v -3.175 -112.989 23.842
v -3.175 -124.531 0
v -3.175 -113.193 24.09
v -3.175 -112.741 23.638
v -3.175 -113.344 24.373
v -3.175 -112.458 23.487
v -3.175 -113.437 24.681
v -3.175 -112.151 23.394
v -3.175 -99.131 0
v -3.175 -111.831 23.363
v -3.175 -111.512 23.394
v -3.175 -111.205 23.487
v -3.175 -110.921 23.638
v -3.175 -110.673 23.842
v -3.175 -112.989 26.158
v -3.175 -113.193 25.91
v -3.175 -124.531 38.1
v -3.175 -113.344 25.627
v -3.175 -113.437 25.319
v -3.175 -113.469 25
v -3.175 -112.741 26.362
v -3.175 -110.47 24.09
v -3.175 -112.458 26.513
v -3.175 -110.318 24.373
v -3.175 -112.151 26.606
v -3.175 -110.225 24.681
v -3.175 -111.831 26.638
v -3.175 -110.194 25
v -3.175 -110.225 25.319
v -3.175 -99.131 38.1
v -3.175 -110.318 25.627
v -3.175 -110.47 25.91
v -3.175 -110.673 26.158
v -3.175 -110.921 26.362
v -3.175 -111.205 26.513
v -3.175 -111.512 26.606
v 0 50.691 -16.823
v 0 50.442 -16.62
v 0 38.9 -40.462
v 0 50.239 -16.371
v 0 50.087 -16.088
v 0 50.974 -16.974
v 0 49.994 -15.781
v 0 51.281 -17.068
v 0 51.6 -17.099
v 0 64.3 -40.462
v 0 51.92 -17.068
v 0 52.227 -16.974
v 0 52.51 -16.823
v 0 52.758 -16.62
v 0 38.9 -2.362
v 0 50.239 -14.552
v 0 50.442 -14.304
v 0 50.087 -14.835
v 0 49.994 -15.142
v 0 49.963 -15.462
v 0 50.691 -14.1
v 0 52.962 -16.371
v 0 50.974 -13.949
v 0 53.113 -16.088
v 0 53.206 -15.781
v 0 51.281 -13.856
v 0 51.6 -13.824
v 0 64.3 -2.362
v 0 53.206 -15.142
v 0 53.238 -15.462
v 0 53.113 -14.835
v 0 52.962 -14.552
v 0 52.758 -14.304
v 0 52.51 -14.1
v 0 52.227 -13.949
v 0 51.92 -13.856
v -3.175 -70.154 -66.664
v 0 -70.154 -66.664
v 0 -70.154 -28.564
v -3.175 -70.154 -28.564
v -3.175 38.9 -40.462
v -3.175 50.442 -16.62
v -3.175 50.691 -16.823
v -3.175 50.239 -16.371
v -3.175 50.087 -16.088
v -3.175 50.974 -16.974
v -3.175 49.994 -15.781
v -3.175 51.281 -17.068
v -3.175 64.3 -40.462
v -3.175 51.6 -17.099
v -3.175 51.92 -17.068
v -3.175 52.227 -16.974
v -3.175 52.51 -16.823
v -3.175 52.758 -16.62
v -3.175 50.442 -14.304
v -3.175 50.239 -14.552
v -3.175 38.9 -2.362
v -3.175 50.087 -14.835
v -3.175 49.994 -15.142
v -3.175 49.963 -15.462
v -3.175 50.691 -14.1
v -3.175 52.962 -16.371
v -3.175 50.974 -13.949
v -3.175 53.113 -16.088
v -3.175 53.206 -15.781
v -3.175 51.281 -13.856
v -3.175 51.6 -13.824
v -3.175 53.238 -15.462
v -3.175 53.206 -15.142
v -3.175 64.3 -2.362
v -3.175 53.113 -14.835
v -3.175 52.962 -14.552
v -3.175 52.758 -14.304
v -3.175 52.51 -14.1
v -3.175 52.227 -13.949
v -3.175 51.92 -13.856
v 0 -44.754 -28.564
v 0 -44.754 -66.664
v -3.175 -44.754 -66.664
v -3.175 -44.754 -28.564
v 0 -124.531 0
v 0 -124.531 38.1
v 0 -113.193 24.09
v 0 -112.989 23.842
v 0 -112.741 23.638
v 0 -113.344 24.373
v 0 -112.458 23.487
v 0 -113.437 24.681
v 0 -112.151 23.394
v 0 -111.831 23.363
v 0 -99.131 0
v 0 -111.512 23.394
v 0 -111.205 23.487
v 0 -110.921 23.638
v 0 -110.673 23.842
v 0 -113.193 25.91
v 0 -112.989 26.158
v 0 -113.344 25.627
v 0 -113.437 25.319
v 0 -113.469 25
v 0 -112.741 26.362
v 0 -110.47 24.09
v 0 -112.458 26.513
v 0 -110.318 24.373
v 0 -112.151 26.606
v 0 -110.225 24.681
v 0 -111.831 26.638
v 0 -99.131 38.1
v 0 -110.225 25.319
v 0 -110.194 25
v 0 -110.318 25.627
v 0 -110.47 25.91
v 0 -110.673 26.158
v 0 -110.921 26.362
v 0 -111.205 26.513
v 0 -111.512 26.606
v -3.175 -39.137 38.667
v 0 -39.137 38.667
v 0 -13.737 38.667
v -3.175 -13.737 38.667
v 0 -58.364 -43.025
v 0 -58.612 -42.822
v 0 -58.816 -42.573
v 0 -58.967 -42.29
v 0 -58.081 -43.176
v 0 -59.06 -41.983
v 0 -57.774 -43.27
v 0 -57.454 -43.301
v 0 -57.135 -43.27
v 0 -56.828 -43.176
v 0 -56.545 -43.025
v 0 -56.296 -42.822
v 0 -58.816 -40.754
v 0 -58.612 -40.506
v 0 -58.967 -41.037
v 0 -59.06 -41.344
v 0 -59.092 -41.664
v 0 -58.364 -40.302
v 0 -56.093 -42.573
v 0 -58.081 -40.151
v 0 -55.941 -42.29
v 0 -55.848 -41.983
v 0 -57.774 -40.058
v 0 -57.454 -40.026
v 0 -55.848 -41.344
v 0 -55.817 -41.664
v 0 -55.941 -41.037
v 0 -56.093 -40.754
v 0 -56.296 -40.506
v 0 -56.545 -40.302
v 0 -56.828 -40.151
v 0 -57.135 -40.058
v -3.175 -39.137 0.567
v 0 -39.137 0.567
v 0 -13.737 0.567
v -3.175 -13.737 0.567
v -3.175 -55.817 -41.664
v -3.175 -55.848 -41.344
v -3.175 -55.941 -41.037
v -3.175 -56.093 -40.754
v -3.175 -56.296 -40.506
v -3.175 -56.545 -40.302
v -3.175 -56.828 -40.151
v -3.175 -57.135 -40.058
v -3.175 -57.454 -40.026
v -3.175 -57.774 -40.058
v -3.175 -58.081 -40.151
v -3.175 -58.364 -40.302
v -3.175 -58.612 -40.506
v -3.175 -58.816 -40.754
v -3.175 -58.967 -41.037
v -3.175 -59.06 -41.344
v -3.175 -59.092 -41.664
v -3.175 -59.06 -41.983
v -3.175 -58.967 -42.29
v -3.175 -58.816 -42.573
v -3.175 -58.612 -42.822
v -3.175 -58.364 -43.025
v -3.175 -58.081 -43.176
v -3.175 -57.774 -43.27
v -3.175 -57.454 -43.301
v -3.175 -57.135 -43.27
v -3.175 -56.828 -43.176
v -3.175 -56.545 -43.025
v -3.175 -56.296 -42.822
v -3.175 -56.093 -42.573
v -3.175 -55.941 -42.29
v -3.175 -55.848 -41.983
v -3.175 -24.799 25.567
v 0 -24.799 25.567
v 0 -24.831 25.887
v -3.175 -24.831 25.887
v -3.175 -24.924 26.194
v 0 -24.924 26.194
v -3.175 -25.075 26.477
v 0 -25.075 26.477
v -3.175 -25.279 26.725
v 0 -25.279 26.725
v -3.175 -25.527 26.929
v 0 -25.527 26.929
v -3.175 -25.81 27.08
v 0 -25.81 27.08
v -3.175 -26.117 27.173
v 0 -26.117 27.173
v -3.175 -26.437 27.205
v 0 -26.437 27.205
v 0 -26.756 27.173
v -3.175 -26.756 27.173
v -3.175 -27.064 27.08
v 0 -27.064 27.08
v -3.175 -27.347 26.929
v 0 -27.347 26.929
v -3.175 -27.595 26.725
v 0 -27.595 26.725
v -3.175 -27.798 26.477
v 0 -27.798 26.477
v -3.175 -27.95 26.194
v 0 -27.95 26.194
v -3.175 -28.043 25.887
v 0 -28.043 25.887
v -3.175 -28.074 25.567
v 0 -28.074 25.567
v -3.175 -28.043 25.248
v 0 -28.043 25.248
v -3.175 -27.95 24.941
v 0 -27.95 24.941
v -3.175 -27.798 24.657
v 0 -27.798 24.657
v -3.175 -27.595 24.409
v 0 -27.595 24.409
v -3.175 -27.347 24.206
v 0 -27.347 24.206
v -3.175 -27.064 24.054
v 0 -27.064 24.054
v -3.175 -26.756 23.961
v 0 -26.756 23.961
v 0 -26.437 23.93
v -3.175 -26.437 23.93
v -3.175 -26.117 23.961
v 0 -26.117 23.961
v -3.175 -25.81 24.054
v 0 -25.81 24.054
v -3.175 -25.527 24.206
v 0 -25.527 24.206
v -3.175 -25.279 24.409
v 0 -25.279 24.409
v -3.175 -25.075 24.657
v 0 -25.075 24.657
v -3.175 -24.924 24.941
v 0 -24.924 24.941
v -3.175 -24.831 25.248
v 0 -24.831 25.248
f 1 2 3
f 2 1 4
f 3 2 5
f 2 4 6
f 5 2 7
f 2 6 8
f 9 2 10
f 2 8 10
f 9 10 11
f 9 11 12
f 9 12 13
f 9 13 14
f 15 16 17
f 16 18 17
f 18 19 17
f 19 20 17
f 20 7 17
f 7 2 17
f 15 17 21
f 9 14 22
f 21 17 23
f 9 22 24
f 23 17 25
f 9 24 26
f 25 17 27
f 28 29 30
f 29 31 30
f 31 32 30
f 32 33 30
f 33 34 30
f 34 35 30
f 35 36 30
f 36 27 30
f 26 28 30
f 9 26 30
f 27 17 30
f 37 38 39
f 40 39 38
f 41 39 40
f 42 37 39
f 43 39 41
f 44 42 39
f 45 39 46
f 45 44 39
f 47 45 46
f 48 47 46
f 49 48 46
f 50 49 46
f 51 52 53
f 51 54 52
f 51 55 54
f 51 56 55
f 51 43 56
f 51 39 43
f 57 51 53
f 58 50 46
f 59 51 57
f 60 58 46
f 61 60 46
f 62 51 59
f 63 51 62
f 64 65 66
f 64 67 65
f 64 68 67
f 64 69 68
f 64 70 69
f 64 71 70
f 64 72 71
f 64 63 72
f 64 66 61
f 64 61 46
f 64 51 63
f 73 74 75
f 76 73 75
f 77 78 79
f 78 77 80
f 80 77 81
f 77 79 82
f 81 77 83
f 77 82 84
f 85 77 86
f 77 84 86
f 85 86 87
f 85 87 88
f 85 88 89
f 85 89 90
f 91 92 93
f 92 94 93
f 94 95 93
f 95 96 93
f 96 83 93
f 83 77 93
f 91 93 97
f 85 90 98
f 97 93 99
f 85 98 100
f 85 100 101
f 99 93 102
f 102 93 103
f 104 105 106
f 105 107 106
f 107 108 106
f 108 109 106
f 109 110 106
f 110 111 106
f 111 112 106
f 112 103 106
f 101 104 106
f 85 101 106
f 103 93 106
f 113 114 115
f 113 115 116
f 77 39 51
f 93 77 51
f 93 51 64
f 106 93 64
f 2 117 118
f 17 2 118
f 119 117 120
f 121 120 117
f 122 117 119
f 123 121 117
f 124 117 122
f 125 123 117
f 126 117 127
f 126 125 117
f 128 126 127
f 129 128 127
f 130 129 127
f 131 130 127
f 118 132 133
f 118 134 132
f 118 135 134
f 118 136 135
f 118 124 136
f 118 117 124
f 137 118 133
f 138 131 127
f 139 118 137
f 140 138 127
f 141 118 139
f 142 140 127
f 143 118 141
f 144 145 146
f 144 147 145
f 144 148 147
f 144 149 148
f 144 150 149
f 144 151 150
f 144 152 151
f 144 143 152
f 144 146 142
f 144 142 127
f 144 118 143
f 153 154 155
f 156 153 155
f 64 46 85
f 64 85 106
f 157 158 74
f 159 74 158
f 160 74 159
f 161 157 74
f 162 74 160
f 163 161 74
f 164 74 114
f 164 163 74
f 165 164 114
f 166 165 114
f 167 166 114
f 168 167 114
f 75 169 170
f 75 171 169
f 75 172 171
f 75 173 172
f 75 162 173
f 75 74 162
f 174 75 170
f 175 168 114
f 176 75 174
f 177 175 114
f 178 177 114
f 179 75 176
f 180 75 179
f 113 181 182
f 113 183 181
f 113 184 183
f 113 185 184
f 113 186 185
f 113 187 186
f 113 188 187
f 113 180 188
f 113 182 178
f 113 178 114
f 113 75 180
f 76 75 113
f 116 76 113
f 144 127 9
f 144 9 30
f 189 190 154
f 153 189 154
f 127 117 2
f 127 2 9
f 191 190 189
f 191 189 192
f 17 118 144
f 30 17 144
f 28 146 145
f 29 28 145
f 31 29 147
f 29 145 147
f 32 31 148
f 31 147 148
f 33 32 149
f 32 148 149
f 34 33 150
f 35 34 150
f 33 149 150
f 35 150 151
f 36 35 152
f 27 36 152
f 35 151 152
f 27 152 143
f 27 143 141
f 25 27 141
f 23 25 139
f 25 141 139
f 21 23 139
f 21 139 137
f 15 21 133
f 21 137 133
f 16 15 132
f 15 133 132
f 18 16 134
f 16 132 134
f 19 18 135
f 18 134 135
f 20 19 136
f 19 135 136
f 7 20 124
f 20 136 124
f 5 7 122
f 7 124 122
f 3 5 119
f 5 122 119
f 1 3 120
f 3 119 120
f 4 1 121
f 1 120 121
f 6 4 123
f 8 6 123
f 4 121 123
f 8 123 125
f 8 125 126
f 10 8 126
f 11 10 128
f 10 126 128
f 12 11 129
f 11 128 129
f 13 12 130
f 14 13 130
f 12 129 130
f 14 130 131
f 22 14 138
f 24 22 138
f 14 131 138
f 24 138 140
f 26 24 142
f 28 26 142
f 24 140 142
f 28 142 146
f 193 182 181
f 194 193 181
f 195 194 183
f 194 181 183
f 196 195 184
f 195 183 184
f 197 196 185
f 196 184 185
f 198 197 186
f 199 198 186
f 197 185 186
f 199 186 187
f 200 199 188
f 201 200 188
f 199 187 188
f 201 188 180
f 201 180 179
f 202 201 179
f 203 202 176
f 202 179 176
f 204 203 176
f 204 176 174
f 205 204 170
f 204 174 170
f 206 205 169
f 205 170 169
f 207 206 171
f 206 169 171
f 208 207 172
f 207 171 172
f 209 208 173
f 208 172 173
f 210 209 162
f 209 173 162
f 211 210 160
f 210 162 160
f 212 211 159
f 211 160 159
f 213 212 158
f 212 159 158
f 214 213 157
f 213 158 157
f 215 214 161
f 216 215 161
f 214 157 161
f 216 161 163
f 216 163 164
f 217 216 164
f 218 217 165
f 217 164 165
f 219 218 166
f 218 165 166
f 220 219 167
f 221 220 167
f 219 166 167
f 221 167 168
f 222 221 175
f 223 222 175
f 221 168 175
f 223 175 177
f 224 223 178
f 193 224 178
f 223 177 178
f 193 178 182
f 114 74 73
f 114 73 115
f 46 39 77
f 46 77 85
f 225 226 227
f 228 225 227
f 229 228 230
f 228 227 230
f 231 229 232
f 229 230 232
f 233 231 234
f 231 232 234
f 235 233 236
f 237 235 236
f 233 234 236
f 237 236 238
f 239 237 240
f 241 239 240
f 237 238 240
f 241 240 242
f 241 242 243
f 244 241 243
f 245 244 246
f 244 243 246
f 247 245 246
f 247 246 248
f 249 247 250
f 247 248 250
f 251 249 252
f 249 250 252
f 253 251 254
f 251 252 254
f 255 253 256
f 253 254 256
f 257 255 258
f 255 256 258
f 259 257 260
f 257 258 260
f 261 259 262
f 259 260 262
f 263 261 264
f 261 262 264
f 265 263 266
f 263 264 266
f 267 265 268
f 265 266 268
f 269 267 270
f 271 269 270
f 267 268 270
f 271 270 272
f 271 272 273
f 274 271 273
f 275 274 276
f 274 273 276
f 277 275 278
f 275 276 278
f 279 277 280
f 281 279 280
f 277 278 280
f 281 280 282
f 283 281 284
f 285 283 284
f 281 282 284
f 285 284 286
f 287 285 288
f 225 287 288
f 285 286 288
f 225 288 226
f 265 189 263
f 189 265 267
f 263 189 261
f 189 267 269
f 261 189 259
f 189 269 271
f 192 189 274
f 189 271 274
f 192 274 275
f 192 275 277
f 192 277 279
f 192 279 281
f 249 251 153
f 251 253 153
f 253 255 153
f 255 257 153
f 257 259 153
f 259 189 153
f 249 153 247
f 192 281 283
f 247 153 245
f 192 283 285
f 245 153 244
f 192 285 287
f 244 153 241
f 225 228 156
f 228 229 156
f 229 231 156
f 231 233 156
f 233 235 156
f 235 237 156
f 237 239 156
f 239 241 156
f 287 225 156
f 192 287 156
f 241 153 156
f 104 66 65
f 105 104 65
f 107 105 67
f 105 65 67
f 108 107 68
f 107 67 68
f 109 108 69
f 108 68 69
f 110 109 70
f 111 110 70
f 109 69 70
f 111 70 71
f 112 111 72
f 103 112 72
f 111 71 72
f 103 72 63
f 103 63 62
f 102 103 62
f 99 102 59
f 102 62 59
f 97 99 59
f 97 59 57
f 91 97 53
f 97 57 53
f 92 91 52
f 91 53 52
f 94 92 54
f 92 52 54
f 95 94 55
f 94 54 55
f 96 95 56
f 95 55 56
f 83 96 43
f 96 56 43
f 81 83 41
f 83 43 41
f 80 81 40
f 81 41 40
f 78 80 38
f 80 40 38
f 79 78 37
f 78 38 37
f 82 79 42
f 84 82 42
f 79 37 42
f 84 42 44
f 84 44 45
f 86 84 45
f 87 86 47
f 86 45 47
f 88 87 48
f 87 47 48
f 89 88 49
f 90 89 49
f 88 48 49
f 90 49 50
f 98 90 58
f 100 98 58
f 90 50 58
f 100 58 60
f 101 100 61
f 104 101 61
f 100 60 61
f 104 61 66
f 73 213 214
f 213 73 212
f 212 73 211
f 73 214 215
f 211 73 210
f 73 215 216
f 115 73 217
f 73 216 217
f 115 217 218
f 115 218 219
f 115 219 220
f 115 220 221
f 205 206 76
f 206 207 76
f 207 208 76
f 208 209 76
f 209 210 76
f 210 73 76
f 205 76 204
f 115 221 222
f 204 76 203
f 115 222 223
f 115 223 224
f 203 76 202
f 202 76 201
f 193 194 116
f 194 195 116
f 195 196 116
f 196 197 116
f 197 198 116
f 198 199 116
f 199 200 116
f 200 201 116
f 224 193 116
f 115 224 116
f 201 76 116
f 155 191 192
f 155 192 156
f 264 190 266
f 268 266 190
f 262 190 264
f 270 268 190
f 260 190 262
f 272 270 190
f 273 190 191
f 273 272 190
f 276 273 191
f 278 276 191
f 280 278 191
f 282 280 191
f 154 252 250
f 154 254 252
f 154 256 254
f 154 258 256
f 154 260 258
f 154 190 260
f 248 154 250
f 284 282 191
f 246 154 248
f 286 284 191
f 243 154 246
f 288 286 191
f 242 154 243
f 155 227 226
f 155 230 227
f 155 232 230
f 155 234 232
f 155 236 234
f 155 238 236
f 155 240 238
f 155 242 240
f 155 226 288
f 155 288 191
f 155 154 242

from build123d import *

# Parameters (mm, degrees)
F0_W     = 25.4
F0_H     = 38.1
F0_R     = 1.6375
F1_DEPTH = 3.175
F2_DEPTH = 3.175
F3_DEPTH = 3.175
F4_DEPTH = 3.175


with BuildPart() as f1:
    # F0 (on Right) → F1 (new body)
    with BuildSketch(Plane.YZ):
        with Locations((-26.436894, 19.617149)):
            Rectangle(F0_W, F0_H)
        with Locations((-26.436894, 25.56715)):
            Circle(F0_R, mode=Mode.SUBTRACT)
    extrude(amount=-F1_DEPTH)


with BuildPart() as f2:
    # F0 (on Right) → F2 (new body)
    with BuildSketch(Plane.YZ):
        with Locations((51.60028, -21.411628)):
            Rectangle(F0_W, F0_H)
        with Locations((51.60028, -15.461628)):
            Circle(F0_R, mode=Mode.SUBTRACT)
    extrude(amount=-F2_DEPTH)


with BuildPart() as f3:
    # F0 (on Right) → F3 (new body)
    with BuildSketch(Plane.YZ):
        with Locations((-111.831239, 19.05)):
            Rectangle(F0_W, F0_H)
        with Locations((-111.831239, 25.000001)):
            Circle(F0_R, mode=Mode.SUBTRACT)
    extrude(amount=-F3_DEPTH)


with BuildPart() as f4:
    # F0 (on Right) → F4 (new body)
    with BuildSketch(Plane.YZ):
        with Locations((-57.454268, -47.613632)):
            Rectangle(F0_W, F0_H)
        with Locations((-57.454268, -41.663631)):
            Circle(F0_R, mode=Mode.SUBTRACT)
    extrude(amount=-F4_DEPTH)


solid = Compound([f1.part, f2.part, f3.part, f4.part])
